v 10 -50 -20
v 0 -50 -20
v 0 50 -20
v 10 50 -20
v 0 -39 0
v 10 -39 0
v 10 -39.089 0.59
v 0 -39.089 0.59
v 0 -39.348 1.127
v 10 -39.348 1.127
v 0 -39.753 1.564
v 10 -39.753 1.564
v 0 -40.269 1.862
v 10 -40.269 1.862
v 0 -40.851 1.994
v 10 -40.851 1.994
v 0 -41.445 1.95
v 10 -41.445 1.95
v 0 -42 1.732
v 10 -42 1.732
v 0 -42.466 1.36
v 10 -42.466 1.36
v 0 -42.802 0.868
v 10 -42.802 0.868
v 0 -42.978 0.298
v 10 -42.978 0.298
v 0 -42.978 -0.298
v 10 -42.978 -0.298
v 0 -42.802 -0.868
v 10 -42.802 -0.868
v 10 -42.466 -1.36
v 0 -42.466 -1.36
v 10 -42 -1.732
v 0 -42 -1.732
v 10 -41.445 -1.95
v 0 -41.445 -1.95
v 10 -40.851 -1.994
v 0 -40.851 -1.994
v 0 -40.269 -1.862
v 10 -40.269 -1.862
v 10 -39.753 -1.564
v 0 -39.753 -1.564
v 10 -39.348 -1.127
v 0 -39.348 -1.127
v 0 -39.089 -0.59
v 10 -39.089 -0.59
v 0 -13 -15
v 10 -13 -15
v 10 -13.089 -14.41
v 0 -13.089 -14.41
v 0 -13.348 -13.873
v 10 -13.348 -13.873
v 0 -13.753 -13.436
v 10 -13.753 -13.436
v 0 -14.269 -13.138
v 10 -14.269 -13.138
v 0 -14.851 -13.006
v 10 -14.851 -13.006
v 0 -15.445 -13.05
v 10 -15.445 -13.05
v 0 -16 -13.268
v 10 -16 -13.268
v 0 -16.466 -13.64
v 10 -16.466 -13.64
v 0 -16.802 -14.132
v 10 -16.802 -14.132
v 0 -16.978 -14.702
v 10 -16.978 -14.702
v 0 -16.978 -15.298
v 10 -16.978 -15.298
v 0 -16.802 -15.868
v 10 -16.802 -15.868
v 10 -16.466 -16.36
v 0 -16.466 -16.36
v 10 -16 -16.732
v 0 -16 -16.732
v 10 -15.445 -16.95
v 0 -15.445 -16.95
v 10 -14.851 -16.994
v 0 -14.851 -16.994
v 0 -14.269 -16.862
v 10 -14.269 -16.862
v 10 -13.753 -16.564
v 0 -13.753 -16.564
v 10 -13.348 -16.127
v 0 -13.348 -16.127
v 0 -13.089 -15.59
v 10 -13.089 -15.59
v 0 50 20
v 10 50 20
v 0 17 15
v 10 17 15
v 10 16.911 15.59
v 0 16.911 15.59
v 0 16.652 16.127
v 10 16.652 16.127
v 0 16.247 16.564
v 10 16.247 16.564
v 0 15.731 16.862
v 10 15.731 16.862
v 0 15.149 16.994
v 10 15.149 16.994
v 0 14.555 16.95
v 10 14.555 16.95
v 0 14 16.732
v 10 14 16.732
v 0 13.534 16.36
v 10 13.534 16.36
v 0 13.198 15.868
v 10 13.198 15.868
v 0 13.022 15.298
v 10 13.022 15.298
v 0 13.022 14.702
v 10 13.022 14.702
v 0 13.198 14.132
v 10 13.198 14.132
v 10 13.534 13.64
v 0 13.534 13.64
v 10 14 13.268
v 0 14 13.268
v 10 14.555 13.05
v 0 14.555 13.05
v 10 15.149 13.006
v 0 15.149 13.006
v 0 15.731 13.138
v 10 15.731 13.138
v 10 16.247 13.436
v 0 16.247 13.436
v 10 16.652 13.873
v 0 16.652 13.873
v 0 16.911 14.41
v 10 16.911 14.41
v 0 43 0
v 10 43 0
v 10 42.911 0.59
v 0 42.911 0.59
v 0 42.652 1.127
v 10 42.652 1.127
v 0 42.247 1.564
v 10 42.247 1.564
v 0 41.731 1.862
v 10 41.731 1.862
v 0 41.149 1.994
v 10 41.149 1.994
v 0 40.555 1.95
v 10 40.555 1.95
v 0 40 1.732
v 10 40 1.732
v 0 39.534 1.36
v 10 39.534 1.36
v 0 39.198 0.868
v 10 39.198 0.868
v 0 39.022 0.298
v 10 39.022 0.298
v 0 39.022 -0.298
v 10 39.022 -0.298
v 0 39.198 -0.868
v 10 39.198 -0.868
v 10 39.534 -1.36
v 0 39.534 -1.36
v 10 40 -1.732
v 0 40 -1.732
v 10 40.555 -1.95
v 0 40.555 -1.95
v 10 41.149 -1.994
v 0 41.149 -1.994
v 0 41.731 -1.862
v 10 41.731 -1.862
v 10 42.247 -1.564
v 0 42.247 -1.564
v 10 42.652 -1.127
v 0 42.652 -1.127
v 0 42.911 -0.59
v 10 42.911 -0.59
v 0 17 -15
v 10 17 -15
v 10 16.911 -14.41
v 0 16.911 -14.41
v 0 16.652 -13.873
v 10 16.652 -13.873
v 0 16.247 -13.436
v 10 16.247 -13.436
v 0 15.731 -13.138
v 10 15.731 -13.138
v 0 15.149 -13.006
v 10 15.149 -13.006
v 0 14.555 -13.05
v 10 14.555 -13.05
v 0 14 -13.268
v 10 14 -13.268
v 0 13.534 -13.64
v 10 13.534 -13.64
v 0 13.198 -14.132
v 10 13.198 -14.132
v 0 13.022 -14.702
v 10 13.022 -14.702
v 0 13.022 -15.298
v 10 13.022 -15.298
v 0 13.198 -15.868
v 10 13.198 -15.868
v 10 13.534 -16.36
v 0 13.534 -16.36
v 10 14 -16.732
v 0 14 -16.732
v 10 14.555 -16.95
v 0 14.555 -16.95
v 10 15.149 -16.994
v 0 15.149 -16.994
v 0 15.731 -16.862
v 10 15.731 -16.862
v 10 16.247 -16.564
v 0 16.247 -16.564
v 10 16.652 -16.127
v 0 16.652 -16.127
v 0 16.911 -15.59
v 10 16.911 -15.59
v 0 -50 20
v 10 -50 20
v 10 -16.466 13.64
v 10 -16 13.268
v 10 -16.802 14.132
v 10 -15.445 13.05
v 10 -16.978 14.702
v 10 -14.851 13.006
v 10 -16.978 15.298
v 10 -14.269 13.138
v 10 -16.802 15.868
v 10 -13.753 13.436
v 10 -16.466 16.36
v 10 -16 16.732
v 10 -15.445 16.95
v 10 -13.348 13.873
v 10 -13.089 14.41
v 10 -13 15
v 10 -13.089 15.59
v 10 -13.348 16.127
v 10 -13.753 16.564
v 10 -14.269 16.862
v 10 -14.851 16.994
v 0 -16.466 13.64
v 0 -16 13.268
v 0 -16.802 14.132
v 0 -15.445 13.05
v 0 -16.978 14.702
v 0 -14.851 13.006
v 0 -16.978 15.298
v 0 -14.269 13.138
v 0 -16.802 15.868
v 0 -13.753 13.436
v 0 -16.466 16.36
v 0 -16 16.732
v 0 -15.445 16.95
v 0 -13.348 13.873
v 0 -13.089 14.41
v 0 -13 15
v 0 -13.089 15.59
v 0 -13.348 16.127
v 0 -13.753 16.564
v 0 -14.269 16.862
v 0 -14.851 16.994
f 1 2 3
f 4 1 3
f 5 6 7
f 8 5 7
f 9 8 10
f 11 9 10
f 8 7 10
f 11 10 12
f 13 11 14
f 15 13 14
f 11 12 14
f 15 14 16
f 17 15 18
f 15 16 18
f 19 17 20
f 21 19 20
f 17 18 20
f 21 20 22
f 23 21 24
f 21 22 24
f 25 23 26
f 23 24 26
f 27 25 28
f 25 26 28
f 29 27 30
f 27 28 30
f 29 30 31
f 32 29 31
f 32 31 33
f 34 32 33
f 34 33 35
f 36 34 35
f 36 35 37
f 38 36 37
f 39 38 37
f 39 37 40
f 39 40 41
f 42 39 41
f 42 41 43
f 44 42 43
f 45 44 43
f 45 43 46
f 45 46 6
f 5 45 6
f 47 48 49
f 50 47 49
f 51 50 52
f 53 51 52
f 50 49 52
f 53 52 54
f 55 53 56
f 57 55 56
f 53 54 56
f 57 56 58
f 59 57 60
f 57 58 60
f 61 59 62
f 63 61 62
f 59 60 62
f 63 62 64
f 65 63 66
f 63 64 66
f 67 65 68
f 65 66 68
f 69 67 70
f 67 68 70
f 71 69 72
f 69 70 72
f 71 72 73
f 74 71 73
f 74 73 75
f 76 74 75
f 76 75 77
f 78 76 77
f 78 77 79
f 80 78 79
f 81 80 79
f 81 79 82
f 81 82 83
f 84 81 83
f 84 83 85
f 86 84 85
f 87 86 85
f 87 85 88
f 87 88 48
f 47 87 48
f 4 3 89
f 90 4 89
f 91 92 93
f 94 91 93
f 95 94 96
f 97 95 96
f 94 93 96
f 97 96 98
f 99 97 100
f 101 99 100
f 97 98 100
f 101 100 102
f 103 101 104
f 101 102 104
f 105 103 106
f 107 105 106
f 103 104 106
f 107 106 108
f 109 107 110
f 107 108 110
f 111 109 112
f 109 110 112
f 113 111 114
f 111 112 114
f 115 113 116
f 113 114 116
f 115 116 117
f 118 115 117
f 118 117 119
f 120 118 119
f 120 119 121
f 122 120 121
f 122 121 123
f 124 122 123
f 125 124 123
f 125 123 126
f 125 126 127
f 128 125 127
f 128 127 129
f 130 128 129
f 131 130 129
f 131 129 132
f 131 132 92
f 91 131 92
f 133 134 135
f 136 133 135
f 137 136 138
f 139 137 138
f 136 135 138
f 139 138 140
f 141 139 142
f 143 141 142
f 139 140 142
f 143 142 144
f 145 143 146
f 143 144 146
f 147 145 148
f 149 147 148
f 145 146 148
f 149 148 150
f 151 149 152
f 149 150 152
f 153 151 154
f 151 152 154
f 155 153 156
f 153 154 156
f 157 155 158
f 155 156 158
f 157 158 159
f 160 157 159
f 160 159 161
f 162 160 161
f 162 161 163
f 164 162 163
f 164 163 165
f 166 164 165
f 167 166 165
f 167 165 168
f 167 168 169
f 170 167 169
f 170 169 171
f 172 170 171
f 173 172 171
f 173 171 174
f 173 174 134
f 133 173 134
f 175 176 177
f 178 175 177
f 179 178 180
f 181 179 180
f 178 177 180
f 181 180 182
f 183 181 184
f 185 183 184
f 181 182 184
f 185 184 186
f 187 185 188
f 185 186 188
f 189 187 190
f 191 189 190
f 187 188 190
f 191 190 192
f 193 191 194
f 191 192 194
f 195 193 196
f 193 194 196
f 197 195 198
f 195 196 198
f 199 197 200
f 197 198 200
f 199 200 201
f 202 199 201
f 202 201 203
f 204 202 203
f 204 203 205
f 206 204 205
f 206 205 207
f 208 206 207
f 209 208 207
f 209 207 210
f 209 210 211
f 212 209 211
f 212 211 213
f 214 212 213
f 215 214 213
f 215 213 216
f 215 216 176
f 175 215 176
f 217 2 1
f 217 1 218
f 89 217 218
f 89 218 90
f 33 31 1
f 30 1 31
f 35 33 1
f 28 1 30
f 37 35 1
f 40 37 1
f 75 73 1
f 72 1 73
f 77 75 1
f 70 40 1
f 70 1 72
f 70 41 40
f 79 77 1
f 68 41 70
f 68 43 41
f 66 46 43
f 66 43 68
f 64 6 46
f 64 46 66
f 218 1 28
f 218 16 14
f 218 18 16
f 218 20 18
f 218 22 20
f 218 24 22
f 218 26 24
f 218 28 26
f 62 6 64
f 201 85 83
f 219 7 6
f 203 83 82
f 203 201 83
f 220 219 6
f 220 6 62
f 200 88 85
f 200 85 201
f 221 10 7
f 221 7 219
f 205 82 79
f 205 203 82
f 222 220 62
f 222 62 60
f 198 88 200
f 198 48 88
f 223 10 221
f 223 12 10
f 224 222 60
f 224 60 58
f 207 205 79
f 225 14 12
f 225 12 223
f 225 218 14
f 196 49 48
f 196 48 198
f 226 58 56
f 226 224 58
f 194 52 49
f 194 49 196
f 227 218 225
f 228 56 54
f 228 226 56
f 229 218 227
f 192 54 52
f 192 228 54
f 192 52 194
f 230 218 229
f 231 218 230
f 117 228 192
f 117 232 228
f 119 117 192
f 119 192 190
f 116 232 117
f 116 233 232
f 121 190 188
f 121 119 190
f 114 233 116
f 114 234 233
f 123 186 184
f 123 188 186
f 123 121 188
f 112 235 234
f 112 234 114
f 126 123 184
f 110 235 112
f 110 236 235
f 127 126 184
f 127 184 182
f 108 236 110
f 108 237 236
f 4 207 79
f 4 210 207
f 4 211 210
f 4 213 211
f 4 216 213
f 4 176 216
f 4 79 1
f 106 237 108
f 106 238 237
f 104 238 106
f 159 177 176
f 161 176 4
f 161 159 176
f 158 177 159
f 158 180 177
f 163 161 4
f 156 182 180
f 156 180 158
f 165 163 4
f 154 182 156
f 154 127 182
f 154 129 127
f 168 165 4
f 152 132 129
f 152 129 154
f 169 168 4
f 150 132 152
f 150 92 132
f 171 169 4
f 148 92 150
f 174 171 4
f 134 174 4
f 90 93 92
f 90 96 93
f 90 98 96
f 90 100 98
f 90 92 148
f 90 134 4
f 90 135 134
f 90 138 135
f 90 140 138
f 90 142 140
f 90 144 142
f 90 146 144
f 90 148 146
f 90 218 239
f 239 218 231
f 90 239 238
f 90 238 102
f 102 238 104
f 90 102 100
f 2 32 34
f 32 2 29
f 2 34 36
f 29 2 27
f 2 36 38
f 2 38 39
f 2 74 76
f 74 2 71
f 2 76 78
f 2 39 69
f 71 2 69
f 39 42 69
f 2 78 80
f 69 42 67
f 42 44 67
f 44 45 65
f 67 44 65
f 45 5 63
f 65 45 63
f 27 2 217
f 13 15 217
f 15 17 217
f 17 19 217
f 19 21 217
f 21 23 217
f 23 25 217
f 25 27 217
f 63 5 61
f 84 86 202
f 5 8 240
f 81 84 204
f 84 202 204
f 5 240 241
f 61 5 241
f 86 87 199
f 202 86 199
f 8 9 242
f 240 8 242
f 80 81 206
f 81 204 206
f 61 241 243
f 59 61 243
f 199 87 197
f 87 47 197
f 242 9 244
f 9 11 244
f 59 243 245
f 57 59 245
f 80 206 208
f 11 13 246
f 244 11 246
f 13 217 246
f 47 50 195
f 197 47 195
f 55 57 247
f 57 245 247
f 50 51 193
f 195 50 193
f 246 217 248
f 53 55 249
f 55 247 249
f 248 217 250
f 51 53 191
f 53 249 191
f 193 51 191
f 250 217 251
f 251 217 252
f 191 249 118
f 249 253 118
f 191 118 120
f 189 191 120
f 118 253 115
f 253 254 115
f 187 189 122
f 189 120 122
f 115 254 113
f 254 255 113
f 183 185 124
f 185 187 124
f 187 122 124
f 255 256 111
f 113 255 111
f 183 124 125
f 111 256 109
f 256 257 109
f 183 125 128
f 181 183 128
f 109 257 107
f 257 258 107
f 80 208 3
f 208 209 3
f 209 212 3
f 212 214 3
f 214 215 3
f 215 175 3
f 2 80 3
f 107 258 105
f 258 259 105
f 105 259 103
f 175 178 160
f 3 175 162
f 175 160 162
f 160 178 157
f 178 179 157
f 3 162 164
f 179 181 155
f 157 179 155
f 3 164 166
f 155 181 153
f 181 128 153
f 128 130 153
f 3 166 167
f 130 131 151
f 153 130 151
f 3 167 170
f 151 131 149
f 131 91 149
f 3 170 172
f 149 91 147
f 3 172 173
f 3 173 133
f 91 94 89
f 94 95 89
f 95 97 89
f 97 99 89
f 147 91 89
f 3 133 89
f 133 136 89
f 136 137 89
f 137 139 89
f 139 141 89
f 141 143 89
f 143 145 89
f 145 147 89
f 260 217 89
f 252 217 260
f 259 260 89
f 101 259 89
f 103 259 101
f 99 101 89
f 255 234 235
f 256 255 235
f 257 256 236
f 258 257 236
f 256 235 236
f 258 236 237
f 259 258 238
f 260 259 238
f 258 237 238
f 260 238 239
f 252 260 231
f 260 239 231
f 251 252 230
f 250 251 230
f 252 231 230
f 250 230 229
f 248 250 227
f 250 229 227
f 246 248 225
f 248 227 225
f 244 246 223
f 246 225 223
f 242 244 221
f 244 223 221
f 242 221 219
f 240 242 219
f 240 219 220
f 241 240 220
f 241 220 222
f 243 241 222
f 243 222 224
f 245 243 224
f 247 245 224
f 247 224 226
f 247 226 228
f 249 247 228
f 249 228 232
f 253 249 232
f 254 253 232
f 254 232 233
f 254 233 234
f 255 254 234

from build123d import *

# Parameters (mm, degrees)
F0_W     = 100
F0_H     = 40
F1_DEPTH = 10
F2_R     = 2
F3_DEPTH = 10.001
F4_R     = 2
F5_DEPTH = 10.001


with BuildPart() as f1:
    # F0 (on Right) → F1 (new body)
    with BuildSketch(Plane.YZ):
        Rectangle(F0_W, F0_H)
    extrude(amount=F1_DEPTH)

    # F2 (on face) → F3 (cut, through all)
    with BuildSketch(Plane.YZ.offset(10)):
        with Locations((-15, 15)):
            Circle(F2_R)
        with Locations((15, 15)):
            Circle(F2_R)
        with Locations((-15, -15)):
            Circle(F2_R)
        with Locations((15, -15)):
            Circle(F2_R)
    extrude(amount=-F3_DEPTH, mode=Mode.SUBTRACT)

    # F4 (on face) → F5 (cut, through all)
    with BuildSketch(Plane.YZ.offset(10)):
        with Locations((-41, 0)):
            Circle(F4_R)
        with Locations((41, 0)):
            Circle(F4_R)
    extrude(amount=-F5_DEPTH, mode=Mode.SUBTRACT)


solid = f1.part
